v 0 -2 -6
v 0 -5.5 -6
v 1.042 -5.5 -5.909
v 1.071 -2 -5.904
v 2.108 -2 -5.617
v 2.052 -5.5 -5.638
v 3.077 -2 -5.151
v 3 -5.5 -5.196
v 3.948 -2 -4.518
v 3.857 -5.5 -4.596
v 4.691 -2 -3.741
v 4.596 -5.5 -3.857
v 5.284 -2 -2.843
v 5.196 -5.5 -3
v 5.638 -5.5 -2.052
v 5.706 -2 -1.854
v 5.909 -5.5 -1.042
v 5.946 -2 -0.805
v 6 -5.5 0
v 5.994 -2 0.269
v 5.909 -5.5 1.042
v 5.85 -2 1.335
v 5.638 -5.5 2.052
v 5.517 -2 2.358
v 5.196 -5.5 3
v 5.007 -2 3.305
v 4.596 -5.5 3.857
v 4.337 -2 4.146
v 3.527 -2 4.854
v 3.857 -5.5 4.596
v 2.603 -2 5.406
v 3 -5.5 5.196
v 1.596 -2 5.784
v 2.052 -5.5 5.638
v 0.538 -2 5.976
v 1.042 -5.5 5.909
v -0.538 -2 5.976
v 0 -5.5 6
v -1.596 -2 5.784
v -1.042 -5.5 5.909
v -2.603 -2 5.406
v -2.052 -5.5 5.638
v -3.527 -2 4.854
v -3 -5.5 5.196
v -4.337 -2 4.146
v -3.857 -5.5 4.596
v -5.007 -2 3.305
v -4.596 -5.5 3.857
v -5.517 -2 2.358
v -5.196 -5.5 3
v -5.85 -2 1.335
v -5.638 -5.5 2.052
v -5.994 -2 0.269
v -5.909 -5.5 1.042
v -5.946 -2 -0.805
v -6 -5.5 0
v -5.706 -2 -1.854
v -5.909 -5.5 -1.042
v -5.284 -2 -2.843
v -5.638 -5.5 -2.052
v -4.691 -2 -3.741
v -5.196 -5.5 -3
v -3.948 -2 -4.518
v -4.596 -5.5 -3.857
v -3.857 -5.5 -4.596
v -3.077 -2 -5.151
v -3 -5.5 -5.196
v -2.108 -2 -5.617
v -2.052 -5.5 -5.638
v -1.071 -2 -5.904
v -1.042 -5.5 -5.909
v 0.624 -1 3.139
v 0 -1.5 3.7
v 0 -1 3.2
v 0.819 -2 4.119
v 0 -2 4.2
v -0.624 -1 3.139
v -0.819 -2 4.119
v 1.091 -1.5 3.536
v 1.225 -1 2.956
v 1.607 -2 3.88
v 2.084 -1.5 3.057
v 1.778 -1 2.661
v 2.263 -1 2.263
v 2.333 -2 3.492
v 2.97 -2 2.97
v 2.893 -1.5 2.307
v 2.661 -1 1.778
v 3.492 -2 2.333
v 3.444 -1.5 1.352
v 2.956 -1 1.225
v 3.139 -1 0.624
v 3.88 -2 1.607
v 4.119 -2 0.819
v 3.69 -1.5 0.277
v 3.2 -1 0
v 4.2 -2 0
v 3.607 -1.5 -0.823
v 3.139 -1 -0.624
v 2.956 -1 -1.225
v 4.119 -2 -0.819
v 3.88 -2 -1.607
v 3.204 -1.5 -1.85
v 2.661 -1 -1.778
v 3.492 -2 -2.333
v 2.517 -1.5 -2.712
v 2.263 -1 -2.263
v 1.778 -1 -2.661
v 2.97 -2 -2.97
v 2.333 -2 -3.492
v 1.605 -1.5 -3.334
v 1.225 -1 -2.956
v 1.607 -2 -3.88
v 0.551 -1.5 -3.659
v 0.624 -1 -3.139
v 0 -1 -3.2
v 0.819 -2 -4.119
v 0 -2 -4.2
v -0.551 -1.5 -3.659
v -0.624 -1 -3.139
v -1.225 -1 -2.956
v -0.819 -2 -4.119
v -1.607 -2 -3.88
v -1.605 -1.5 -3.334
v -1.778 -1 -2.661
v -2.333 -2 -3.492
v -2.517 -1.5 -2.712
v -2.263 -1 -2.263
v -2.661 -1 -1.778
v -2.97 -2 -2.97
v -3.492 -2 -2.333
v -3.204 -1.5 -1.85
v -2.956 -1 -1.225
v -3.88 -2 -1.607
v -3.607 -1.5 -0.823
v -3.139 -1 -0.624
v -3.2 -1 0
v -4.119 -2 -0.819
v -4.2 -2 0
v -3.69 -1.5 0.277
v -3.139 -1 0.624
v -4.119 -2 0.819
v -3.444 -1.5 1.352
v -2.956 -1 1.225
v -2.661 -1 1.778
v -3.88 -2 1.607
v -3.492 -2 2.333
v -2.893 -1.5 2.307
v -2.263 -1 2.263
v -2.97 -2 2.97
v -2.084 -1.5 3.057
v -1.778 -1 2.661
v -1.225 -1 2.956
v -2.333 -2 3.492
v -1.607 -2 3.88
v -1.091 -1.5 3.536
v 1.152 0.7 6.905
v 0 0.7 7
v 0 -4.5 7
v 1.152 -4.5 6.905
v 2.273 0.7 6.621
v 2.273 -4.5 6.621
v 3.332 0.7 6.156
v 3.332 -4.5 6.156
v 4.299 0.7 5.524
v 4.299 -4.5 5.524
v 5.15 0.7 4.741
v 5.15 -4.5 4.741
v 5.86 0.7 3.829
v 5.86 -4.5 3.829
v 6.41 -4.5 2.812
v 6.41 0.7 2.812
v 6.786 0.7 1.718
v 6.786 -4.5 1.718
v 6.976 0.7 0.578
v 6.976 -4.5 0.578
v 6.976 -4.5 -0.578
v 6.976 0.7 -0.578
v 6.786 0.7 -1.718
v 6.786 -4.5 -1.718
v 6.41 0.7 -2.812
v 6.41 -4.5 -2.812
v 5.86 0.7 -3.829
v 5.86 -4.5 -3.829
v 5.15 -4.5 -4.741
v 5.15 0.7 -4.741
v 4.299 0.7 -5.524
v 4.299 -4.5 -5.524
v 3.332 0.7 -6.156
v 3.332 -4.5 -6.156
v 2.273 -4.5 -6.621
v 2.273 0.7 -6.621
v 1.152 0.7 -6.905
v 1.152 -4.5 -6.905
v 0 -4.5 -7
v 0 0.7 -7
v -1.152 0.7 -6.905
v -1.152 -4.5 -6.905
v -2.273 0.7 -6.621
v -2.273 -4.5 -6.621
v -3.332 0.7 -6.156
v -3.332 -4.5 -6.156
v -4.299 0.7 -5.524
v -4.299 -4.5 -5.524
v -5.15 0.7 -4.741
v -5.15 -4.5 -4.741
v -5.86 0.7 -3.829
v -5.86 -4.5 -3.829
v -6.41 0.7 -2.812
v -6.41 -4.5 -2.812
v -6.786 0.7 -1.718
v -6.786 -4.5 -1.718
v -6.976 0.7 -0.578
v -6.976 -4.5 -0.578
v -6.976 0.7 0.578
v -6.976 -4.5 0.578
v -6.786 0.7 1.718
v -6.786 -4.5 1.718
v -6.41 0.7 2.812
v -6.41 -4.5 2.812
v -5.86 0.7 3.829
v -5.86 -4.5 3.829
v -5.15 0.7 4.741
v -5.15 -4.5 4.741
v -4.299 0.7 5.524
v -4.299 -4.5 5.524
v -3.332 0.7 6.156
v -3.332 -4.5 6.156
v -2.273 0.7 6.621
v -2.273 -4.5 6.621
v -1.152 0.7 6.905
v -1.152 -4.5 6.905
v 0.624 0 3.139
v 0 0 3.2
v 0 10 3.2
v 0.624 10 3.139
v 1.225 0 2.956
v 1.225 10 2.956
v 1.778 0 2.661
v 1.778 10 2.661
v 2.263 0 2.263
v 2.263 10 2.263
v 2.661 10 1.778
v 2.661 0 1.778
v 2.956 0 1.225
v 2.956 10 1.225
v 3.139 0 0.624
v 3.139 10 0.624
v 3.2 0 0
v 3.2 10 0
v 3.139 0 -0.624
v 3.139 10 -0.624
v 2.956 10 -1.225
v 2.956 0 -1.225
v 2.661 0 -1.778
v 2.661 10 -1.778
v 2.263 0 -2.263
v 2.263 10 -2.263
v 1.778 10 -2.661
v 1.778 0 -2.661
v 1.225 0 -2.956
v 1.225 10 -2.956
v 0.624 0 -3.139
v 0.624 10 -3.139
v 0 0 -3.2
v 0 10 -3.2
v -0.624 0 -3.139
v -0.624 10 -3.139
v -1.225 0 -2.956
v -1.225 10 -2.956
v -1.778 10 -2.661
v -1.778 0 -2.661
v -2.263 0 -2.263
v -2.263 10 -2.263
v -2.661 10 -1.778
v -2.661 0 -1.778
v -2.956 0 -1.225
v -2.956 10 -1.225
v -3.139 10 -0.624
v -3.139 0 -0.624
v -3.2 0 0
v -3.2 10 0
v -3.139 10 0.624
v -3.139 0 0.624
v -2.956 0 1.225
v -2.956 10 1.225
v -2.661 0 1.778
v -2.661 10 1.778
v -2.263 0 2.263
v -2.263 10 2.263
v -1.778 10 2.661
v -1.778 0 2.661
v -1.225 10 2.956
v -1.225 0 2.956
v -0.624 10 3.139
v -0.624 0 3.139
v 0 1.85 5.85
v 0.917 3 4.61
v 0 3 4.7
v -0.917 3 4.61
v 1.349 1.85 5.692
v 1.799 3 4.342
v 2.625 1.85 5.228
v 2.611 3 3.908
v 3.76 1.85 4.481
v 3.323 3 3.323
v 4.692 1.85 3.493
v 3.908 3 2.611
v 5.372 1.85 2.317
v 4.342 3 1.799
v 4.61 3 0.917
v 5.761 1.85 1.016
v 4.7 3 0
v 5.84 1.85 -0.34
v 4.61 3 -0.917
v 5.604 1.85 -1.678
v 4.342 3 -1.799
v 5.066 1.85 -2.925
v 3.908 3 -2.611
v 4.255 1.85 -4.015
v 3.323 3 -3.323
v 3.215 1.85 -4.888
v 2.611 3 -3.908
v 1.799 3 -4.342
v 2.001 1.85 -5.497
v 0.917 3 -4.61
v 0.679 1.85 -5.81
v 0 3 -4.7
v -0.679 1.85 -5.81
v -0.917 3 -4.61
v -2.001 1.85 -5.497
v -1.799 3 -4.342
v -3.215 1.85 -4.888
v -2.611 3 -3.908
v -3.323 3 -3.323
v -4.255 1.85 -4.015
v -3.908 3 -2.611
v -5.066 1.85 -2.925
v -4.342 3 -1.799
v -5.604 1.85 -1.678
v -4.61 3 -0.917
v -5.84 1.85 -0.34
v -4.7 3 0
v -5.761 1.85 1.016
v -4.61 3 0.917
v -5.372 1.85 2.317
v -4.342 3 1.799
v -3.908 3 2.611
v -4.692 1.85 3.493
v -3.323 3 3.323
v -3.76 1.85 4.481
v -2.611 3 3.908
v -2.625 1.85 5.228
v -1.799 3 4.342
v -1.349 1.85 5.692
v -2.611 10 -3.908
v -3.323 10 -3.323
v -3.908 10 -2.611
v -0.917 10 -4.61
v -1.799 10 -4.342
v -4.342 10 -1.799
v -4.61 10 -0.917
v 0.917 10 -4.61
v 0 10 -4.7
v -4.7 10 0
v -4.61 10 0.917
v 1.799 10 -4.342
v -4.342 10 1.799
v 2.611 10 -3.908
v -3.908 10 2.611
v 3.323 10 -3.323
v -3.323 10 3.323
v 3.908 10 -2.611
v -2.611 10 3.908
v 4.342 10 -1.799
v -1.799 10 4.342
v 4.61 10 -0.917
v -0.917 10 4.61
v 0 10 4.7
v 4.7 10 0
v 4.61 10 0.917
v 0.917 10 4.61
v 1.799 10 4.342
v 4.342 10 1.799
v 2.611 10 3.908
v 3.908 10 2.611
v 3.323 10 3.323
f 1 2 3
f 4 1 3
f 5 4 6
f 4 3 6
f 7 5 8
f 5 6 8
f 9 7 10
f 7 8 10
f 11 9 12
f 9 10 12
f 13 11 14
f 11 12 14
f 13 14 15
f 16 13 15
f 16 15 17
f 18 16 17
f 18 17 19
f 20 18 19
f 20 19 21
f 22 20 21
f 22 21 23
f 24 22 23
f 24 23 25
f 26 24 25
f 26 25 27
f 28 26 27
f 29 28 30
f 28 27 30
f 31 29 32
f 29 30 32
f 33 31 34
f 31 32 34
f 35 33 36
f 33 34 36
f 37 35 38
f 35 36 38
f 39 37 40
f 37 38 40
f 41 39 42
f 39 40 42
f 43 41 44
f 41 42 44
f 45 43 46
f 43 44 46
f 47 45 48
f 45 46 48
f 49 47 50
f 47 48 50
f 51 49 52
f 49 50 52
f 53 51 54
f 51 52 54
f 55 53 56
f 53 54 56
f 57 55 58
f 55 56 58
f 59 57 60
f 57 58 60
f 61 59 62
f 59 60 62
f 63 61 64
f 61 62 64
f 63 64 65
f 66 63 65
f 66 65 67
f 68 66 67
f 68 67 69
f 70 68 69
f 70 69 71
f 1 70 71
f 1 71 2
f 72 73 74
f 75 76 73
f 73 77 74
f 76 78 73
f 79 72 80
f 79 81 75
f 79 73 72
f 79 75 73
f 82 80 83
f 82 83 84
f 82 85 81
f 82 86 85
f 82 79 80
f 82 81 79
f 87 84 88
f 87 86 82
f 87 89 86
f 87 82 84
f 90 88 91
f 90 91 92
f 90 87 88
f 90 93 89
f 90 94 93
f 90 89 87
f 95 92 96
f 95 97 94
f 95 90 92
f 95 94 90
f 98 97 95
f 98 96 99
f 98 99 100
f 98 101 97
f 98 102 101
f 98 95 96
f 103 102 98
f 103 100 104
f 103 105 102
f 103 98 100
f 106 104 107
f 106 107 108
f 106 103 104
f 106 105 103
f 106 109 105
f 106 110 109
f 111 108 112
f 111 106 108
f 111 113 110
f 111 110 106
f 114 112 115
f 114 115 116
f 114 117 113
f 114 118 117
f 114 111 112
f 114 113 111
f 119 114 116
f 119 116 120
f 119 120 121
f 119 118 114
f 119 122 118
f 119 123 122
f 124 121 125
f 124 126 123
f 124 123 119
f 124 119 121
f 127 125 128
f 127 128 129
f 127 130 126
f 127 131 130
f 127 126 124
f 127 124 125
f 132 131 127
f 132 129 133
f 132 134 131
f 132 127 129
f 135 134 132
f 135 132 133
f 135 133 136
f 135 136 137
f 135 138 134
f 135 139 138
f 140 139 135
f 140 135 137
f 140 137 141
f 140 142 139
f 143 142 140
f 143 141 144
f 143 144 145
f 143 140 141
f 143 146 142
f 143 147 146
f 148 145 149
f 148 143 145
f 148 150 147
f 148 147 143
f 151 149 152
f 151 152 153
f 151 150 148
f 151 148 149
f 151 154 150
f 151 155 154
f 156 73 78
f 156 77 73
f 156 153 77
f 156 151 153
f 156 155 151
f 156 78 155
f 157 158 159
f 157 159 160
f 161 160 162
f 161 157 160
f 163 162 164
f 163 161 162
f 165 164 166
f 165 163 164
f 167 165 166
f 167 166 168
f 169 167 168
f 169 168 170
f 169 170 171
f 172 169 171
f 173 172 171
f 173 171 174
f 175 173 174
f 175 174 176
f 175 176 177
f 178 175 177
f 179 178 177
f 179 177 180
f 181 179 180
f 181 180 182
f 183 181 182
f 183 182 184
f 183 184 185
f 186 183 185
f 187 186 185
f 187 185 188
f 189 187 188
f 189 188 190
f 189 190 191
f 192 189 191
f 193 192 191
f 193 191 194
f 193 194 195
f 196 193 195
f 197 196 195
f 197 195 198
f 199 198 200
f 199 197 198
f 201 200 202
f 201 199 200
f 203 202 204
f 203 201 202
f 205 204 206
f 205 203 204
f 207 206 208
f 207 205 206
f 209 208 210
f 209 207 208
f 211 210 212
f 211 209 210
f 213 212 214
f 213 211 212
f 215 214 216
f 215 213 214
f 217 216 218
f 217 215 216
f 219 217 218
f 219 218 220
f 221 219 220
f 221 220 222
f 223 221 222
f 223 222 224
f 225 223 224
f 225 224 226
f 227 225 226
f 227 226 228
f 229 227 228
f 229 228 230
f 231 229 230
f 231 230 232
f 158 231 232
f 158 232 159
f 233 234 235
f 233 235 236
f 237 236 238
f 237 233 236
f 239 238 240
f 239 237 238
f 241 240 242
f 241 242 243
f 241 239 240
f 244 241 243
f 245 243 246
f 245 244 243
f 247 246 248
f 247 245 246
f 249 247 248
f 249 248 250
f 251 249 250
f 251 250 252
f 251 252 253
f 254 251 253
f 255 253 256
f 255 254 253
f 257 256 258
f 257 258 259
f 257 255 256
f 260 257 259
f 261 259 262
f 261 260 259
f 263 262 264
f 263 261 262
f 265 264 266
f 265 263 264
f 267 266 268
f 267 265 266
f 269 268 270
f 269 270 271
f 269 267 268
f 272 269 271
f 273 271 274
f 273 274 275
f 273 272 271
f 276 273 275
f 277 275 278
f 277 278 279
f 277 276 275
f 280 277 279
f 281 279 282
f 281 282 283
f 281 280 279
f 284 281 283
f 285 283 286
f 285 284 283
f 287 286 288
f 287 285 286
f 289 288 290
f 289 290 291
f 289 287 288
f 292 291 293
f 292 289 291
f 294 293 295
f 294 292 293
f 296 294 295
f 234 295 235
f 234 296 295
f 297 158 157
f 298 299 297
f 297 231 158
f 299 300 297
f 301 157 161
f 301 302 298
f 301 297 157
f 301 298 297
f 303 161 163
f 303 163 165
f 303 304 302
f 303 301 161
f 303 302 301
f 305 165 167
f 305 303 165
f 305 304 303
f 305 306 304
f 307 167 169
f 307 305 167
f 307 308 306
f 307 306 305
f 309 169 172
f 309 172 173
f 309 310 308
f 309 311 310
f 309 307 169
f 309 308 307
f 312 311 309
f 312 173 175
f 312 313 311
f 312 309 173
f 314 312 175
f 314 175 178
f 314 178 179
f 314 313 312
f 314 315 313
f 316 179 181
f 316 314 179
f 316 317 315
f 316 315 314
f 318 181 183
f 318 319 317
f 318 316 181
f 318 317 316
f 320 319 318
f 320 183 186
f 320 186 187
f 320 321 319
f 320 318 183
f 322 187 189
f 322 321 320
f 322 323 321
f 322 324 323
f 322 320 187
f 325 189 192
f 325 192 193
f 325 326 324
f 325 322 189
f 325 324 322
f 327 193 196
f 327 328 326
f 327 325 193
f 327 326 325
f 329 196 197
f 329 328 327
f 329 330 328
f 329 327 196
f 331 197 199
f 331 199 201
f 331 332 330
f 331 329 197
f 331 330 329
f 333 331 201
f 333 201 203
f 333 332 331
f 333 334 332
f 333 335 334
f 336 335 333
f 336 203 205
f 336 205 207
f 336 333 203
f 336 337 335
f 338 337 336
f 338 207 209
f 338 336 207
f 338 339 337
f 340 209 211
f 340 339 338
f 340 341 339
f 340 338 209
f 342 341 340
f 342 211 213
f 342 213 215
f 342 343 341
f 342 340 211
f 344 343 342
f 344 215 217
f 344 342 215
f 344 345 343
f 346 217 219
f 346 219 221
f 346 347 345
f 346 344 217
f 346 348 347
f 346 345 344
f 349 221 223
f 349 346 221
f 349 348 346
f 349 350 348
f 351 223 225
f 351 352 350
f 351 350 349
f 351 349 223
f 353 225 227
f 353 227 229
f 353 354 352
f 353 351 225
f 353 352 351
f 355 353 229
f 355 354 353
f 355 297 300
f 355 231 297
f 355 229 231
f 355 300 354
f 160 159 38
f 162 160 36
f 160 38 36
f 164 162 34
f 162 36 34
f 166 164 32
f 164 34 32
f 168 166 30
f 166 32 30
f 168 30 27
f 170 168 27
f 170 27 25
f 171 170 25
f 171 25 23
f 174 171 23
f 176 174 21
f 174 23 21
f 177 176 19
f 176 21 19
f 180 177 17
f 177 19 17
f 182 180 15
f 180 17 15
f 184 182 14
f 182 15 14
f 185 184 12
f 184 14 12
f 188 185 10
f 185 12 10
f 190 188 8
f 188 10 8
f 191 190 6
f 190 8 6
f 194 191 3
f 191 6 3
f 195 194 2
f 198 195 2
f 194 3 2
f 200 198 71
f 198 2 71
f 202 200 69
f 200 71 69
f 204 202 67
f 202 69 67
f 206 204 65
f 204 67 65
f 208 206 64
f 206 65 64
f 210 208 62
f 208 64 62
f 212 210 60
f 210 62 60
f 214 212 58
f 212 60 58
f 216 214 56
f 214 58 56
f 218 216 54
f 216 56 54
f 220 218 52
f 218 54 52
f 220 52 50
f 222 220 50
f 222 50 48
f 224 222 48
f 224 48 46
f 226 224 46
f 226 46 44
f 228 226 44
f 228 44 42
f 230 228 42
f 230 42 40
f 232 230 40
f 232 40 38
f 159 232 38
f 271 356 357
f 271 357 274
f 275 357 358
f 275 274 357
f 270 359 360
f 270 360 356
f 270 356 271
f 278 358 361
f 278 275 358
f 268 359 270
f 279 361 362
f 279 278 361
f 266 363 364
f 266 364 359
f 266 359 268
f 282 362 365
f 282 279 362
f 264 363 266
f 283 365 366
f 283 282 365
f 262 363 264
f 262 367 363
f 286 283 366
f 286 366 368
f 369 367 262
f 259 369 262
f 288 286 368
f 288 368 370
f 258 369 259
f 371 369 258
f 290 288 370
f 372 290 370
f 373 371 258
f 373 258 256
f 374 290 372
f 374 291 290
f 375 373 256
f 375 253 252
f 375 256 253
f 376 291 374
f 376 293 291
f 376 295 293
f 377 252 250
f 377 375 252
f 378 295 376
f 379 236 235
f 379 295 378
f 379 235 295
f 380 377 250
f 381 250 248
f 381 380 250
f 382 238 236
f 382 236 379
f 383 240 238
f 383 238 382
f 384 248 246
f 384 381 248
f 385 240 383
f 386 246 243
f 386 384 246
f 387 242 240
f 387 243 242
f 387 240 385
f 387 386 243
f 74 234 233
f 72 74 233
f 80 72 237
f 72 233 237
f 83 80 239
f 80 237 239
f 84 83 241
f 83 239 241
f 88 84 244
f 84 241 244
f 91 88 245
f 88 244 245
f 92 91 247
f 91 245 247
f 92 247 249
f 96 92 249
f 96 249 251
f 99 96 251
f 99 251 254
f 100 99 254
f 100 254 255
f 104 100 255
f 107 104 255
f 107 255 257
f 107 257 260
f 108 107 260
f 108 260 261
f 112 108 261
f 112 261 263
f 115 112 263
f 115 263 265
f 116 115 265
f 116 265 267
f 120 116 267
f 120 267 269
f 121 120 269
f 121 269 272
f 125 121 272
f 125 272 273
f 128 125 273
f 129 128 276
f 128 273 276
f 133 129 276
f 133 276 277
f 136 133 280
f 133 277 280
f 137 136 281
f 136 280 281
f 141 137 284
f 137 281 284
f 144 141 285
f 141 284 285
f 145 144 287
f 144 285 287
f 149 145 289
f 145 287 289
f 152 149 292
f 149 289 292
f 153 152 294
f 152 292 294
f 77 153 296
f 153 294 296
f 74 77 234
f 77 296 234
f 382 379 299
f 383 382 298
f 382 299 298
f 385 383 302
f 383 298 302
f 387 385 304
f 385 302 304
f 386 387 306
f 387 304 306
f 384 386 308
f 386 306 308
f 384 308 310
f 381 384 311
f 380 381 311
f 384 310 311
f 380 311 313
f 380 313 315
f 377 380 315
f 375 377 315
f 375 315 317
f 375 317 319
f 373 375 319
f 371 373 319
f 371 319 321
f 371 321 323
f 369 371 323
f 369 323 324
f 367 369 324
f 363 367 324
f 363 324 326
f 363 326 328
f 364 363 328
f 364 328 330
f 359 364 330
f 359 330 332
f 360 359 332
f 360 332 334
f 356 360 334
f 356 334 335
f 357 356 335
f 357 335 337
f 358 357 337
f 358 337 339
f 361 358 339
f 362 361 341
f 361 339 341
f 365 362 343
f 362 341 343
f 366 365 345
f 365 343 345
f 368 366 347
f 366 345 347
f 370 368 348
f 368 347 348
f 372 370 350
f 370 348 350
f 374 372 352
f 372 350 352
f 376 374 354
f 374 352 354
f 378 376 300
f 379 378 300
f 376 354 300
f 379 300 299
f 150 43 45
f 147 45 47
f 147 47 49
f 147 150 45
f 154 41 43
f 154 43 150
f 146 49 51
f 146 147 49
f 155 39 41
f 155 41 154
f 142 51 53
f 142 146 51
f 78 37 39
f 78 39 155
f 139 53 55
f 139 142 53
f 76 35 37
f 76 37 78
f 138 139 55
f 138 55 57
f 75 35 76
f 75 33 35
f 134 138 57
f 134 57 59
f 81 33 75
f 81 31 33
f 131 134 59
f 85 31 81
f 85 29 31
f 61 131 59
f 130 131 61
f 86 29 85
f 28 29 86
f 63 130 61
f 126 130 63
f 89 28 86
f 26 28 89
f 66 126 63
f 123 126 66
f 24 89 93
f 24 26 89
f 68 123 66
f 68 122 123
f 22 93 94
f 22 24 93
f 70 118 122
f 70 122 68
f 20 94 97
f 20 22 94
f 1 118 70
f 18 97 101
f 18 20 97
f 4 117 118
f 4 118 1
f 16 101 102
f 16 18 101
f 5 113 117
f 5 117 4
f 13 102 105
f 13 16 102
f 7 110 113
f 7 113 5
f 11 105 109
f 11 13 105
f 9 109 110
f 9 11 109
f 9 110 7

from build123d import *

# Parameters (mm, degrees)
SKETCH1_R           = 4.7
SKETCH1_R_2         = 3.2
BOSS_EXTRUDE1_DEPTH = 10
SKETCH2_R           = 7
BOSS_EXTRUDE2_DEPTH = 6
SKETCH3_R           = 6
CUT_EXTRUDE1_DEPTH  = 4
SKETCH4_R           = 3.2
CUT_EXTRUDE2_DEPTH  = 15.071247279
CHAMFER2_SIZE       = 1.5
CHAMFER4_SIZE       = 3
CHAMFER5_SIZE       = 1


with BuildPart() as part:
    # Sketch1 → Boss-Extrude1 (new body)
    with BuildSketch(Plane(origin=(0, 0, 0), x_dir=(1, 0, 0), z_dir=(0, 1, 0))):
        with Locations(Location((0, 0, 0), (0, 0, 270))):
            Circle(SKETCH1_R)
        with Locations(Location((0, 0, 0), (0, 0, 270))):
            Circle(SKETCH1_R_2, mode=Mode.SUBTRACT)
    extrude(amount=BOSS_EXTRUDE1_DEPTH)

    # Sketch2 → Boss-Extrude2 (add)
    with BuildSketch(Plane(origin=(0, 0, 0), x_dir=(1, 0, 0), z_dir=(0, 1, 0))):
        with Locations(Location((0, 0, 0), (0, 0, 270))):
            Circle(SKETCH2_R)
    extrude(amount=-BOSS_EXTRUDE2_DEPTH)

    # Sketch3 → Cut-Extrude1 (cut)
    with BuildSketch(Plane.XZ.offset(6)):
        with Locations(Location((0, 0, 0), (0, 0, 270))):
            Circle(SKETCH3_R)
    extrude(amount=-CUT_EXTRUDE1_DEPTH, mode=Mode.SUBTRACT)

    # Sketch4 → Cut-Extrude2 (cut, through all)
    with BuildSketch(Plane(origin=(0, 0, 0), x_dir=(1, 0, 0), z_dir=(0, 1, 0))):
        with Locations(Location((0, 0, 0), (0, 0, 270))):
            Circle(SKETCH4_R)
    extrude(amount=-CUT_EXTRUDE2_DEPTH, mode=Mode.SUBTRACT)

    # Chamfer2
    # the kernel refuses this chamfer: 1.5 mm, written as the material it takes off along each edge
    with BuildSketch(Plane(origin=(0, -6, 0), x_dir=(0, 0, 1), z_dir=(-1, 0, 0))) as chamfer2_piece_1:
        Polygon((7, CHAMFER2_SIZE), (7 - CHAMFER2_SIZE, 0), (7, 0), align=None)
    revolve(axis=Axis((0, -6, 0), (0, 1, 0)), mode=Mode.SUBTRACT)

    # Chamfer4
    # the kernel refuses this chamfer: 3 mm, written as the material it adds along each edge
    with BuildSketch(Plane(origin=(0, 0, 0), x_dir=(0, 0, 1), z_dir=(-1, 0, 0))) as chamfer4_piece_1_section:
        Polygon((4.7 + CHAMFER4_SIZE, 0), (4.7, CHAMFER4_SIZE), (4.7, 0), align=None)
    chamfer4_piece_1 = revolve(axis=Axis((0, 0, 0), (0, 1, 0)), mode=Mode.PRIVATE)
    chamfer4_piece_1 = chamfer4_piece_1 & Plane(origin=(0, 1.853894362, 0), x_dir=(0, 0, 1), z_dir=(0, 1, 0)) * Cylinder(7, 31, mode=Mode.PRIVATE)
    add(chamfer4_piece_1)

    # Chamfer5
    chamfer5_edges = [part.edges().sort_by_distance(p)[0] for p in [
        (0, -2, -3.2),
    ]]
    chamfer(chamfer5_edges, length=CHAMFER5_SIZE)


solid = part.part
